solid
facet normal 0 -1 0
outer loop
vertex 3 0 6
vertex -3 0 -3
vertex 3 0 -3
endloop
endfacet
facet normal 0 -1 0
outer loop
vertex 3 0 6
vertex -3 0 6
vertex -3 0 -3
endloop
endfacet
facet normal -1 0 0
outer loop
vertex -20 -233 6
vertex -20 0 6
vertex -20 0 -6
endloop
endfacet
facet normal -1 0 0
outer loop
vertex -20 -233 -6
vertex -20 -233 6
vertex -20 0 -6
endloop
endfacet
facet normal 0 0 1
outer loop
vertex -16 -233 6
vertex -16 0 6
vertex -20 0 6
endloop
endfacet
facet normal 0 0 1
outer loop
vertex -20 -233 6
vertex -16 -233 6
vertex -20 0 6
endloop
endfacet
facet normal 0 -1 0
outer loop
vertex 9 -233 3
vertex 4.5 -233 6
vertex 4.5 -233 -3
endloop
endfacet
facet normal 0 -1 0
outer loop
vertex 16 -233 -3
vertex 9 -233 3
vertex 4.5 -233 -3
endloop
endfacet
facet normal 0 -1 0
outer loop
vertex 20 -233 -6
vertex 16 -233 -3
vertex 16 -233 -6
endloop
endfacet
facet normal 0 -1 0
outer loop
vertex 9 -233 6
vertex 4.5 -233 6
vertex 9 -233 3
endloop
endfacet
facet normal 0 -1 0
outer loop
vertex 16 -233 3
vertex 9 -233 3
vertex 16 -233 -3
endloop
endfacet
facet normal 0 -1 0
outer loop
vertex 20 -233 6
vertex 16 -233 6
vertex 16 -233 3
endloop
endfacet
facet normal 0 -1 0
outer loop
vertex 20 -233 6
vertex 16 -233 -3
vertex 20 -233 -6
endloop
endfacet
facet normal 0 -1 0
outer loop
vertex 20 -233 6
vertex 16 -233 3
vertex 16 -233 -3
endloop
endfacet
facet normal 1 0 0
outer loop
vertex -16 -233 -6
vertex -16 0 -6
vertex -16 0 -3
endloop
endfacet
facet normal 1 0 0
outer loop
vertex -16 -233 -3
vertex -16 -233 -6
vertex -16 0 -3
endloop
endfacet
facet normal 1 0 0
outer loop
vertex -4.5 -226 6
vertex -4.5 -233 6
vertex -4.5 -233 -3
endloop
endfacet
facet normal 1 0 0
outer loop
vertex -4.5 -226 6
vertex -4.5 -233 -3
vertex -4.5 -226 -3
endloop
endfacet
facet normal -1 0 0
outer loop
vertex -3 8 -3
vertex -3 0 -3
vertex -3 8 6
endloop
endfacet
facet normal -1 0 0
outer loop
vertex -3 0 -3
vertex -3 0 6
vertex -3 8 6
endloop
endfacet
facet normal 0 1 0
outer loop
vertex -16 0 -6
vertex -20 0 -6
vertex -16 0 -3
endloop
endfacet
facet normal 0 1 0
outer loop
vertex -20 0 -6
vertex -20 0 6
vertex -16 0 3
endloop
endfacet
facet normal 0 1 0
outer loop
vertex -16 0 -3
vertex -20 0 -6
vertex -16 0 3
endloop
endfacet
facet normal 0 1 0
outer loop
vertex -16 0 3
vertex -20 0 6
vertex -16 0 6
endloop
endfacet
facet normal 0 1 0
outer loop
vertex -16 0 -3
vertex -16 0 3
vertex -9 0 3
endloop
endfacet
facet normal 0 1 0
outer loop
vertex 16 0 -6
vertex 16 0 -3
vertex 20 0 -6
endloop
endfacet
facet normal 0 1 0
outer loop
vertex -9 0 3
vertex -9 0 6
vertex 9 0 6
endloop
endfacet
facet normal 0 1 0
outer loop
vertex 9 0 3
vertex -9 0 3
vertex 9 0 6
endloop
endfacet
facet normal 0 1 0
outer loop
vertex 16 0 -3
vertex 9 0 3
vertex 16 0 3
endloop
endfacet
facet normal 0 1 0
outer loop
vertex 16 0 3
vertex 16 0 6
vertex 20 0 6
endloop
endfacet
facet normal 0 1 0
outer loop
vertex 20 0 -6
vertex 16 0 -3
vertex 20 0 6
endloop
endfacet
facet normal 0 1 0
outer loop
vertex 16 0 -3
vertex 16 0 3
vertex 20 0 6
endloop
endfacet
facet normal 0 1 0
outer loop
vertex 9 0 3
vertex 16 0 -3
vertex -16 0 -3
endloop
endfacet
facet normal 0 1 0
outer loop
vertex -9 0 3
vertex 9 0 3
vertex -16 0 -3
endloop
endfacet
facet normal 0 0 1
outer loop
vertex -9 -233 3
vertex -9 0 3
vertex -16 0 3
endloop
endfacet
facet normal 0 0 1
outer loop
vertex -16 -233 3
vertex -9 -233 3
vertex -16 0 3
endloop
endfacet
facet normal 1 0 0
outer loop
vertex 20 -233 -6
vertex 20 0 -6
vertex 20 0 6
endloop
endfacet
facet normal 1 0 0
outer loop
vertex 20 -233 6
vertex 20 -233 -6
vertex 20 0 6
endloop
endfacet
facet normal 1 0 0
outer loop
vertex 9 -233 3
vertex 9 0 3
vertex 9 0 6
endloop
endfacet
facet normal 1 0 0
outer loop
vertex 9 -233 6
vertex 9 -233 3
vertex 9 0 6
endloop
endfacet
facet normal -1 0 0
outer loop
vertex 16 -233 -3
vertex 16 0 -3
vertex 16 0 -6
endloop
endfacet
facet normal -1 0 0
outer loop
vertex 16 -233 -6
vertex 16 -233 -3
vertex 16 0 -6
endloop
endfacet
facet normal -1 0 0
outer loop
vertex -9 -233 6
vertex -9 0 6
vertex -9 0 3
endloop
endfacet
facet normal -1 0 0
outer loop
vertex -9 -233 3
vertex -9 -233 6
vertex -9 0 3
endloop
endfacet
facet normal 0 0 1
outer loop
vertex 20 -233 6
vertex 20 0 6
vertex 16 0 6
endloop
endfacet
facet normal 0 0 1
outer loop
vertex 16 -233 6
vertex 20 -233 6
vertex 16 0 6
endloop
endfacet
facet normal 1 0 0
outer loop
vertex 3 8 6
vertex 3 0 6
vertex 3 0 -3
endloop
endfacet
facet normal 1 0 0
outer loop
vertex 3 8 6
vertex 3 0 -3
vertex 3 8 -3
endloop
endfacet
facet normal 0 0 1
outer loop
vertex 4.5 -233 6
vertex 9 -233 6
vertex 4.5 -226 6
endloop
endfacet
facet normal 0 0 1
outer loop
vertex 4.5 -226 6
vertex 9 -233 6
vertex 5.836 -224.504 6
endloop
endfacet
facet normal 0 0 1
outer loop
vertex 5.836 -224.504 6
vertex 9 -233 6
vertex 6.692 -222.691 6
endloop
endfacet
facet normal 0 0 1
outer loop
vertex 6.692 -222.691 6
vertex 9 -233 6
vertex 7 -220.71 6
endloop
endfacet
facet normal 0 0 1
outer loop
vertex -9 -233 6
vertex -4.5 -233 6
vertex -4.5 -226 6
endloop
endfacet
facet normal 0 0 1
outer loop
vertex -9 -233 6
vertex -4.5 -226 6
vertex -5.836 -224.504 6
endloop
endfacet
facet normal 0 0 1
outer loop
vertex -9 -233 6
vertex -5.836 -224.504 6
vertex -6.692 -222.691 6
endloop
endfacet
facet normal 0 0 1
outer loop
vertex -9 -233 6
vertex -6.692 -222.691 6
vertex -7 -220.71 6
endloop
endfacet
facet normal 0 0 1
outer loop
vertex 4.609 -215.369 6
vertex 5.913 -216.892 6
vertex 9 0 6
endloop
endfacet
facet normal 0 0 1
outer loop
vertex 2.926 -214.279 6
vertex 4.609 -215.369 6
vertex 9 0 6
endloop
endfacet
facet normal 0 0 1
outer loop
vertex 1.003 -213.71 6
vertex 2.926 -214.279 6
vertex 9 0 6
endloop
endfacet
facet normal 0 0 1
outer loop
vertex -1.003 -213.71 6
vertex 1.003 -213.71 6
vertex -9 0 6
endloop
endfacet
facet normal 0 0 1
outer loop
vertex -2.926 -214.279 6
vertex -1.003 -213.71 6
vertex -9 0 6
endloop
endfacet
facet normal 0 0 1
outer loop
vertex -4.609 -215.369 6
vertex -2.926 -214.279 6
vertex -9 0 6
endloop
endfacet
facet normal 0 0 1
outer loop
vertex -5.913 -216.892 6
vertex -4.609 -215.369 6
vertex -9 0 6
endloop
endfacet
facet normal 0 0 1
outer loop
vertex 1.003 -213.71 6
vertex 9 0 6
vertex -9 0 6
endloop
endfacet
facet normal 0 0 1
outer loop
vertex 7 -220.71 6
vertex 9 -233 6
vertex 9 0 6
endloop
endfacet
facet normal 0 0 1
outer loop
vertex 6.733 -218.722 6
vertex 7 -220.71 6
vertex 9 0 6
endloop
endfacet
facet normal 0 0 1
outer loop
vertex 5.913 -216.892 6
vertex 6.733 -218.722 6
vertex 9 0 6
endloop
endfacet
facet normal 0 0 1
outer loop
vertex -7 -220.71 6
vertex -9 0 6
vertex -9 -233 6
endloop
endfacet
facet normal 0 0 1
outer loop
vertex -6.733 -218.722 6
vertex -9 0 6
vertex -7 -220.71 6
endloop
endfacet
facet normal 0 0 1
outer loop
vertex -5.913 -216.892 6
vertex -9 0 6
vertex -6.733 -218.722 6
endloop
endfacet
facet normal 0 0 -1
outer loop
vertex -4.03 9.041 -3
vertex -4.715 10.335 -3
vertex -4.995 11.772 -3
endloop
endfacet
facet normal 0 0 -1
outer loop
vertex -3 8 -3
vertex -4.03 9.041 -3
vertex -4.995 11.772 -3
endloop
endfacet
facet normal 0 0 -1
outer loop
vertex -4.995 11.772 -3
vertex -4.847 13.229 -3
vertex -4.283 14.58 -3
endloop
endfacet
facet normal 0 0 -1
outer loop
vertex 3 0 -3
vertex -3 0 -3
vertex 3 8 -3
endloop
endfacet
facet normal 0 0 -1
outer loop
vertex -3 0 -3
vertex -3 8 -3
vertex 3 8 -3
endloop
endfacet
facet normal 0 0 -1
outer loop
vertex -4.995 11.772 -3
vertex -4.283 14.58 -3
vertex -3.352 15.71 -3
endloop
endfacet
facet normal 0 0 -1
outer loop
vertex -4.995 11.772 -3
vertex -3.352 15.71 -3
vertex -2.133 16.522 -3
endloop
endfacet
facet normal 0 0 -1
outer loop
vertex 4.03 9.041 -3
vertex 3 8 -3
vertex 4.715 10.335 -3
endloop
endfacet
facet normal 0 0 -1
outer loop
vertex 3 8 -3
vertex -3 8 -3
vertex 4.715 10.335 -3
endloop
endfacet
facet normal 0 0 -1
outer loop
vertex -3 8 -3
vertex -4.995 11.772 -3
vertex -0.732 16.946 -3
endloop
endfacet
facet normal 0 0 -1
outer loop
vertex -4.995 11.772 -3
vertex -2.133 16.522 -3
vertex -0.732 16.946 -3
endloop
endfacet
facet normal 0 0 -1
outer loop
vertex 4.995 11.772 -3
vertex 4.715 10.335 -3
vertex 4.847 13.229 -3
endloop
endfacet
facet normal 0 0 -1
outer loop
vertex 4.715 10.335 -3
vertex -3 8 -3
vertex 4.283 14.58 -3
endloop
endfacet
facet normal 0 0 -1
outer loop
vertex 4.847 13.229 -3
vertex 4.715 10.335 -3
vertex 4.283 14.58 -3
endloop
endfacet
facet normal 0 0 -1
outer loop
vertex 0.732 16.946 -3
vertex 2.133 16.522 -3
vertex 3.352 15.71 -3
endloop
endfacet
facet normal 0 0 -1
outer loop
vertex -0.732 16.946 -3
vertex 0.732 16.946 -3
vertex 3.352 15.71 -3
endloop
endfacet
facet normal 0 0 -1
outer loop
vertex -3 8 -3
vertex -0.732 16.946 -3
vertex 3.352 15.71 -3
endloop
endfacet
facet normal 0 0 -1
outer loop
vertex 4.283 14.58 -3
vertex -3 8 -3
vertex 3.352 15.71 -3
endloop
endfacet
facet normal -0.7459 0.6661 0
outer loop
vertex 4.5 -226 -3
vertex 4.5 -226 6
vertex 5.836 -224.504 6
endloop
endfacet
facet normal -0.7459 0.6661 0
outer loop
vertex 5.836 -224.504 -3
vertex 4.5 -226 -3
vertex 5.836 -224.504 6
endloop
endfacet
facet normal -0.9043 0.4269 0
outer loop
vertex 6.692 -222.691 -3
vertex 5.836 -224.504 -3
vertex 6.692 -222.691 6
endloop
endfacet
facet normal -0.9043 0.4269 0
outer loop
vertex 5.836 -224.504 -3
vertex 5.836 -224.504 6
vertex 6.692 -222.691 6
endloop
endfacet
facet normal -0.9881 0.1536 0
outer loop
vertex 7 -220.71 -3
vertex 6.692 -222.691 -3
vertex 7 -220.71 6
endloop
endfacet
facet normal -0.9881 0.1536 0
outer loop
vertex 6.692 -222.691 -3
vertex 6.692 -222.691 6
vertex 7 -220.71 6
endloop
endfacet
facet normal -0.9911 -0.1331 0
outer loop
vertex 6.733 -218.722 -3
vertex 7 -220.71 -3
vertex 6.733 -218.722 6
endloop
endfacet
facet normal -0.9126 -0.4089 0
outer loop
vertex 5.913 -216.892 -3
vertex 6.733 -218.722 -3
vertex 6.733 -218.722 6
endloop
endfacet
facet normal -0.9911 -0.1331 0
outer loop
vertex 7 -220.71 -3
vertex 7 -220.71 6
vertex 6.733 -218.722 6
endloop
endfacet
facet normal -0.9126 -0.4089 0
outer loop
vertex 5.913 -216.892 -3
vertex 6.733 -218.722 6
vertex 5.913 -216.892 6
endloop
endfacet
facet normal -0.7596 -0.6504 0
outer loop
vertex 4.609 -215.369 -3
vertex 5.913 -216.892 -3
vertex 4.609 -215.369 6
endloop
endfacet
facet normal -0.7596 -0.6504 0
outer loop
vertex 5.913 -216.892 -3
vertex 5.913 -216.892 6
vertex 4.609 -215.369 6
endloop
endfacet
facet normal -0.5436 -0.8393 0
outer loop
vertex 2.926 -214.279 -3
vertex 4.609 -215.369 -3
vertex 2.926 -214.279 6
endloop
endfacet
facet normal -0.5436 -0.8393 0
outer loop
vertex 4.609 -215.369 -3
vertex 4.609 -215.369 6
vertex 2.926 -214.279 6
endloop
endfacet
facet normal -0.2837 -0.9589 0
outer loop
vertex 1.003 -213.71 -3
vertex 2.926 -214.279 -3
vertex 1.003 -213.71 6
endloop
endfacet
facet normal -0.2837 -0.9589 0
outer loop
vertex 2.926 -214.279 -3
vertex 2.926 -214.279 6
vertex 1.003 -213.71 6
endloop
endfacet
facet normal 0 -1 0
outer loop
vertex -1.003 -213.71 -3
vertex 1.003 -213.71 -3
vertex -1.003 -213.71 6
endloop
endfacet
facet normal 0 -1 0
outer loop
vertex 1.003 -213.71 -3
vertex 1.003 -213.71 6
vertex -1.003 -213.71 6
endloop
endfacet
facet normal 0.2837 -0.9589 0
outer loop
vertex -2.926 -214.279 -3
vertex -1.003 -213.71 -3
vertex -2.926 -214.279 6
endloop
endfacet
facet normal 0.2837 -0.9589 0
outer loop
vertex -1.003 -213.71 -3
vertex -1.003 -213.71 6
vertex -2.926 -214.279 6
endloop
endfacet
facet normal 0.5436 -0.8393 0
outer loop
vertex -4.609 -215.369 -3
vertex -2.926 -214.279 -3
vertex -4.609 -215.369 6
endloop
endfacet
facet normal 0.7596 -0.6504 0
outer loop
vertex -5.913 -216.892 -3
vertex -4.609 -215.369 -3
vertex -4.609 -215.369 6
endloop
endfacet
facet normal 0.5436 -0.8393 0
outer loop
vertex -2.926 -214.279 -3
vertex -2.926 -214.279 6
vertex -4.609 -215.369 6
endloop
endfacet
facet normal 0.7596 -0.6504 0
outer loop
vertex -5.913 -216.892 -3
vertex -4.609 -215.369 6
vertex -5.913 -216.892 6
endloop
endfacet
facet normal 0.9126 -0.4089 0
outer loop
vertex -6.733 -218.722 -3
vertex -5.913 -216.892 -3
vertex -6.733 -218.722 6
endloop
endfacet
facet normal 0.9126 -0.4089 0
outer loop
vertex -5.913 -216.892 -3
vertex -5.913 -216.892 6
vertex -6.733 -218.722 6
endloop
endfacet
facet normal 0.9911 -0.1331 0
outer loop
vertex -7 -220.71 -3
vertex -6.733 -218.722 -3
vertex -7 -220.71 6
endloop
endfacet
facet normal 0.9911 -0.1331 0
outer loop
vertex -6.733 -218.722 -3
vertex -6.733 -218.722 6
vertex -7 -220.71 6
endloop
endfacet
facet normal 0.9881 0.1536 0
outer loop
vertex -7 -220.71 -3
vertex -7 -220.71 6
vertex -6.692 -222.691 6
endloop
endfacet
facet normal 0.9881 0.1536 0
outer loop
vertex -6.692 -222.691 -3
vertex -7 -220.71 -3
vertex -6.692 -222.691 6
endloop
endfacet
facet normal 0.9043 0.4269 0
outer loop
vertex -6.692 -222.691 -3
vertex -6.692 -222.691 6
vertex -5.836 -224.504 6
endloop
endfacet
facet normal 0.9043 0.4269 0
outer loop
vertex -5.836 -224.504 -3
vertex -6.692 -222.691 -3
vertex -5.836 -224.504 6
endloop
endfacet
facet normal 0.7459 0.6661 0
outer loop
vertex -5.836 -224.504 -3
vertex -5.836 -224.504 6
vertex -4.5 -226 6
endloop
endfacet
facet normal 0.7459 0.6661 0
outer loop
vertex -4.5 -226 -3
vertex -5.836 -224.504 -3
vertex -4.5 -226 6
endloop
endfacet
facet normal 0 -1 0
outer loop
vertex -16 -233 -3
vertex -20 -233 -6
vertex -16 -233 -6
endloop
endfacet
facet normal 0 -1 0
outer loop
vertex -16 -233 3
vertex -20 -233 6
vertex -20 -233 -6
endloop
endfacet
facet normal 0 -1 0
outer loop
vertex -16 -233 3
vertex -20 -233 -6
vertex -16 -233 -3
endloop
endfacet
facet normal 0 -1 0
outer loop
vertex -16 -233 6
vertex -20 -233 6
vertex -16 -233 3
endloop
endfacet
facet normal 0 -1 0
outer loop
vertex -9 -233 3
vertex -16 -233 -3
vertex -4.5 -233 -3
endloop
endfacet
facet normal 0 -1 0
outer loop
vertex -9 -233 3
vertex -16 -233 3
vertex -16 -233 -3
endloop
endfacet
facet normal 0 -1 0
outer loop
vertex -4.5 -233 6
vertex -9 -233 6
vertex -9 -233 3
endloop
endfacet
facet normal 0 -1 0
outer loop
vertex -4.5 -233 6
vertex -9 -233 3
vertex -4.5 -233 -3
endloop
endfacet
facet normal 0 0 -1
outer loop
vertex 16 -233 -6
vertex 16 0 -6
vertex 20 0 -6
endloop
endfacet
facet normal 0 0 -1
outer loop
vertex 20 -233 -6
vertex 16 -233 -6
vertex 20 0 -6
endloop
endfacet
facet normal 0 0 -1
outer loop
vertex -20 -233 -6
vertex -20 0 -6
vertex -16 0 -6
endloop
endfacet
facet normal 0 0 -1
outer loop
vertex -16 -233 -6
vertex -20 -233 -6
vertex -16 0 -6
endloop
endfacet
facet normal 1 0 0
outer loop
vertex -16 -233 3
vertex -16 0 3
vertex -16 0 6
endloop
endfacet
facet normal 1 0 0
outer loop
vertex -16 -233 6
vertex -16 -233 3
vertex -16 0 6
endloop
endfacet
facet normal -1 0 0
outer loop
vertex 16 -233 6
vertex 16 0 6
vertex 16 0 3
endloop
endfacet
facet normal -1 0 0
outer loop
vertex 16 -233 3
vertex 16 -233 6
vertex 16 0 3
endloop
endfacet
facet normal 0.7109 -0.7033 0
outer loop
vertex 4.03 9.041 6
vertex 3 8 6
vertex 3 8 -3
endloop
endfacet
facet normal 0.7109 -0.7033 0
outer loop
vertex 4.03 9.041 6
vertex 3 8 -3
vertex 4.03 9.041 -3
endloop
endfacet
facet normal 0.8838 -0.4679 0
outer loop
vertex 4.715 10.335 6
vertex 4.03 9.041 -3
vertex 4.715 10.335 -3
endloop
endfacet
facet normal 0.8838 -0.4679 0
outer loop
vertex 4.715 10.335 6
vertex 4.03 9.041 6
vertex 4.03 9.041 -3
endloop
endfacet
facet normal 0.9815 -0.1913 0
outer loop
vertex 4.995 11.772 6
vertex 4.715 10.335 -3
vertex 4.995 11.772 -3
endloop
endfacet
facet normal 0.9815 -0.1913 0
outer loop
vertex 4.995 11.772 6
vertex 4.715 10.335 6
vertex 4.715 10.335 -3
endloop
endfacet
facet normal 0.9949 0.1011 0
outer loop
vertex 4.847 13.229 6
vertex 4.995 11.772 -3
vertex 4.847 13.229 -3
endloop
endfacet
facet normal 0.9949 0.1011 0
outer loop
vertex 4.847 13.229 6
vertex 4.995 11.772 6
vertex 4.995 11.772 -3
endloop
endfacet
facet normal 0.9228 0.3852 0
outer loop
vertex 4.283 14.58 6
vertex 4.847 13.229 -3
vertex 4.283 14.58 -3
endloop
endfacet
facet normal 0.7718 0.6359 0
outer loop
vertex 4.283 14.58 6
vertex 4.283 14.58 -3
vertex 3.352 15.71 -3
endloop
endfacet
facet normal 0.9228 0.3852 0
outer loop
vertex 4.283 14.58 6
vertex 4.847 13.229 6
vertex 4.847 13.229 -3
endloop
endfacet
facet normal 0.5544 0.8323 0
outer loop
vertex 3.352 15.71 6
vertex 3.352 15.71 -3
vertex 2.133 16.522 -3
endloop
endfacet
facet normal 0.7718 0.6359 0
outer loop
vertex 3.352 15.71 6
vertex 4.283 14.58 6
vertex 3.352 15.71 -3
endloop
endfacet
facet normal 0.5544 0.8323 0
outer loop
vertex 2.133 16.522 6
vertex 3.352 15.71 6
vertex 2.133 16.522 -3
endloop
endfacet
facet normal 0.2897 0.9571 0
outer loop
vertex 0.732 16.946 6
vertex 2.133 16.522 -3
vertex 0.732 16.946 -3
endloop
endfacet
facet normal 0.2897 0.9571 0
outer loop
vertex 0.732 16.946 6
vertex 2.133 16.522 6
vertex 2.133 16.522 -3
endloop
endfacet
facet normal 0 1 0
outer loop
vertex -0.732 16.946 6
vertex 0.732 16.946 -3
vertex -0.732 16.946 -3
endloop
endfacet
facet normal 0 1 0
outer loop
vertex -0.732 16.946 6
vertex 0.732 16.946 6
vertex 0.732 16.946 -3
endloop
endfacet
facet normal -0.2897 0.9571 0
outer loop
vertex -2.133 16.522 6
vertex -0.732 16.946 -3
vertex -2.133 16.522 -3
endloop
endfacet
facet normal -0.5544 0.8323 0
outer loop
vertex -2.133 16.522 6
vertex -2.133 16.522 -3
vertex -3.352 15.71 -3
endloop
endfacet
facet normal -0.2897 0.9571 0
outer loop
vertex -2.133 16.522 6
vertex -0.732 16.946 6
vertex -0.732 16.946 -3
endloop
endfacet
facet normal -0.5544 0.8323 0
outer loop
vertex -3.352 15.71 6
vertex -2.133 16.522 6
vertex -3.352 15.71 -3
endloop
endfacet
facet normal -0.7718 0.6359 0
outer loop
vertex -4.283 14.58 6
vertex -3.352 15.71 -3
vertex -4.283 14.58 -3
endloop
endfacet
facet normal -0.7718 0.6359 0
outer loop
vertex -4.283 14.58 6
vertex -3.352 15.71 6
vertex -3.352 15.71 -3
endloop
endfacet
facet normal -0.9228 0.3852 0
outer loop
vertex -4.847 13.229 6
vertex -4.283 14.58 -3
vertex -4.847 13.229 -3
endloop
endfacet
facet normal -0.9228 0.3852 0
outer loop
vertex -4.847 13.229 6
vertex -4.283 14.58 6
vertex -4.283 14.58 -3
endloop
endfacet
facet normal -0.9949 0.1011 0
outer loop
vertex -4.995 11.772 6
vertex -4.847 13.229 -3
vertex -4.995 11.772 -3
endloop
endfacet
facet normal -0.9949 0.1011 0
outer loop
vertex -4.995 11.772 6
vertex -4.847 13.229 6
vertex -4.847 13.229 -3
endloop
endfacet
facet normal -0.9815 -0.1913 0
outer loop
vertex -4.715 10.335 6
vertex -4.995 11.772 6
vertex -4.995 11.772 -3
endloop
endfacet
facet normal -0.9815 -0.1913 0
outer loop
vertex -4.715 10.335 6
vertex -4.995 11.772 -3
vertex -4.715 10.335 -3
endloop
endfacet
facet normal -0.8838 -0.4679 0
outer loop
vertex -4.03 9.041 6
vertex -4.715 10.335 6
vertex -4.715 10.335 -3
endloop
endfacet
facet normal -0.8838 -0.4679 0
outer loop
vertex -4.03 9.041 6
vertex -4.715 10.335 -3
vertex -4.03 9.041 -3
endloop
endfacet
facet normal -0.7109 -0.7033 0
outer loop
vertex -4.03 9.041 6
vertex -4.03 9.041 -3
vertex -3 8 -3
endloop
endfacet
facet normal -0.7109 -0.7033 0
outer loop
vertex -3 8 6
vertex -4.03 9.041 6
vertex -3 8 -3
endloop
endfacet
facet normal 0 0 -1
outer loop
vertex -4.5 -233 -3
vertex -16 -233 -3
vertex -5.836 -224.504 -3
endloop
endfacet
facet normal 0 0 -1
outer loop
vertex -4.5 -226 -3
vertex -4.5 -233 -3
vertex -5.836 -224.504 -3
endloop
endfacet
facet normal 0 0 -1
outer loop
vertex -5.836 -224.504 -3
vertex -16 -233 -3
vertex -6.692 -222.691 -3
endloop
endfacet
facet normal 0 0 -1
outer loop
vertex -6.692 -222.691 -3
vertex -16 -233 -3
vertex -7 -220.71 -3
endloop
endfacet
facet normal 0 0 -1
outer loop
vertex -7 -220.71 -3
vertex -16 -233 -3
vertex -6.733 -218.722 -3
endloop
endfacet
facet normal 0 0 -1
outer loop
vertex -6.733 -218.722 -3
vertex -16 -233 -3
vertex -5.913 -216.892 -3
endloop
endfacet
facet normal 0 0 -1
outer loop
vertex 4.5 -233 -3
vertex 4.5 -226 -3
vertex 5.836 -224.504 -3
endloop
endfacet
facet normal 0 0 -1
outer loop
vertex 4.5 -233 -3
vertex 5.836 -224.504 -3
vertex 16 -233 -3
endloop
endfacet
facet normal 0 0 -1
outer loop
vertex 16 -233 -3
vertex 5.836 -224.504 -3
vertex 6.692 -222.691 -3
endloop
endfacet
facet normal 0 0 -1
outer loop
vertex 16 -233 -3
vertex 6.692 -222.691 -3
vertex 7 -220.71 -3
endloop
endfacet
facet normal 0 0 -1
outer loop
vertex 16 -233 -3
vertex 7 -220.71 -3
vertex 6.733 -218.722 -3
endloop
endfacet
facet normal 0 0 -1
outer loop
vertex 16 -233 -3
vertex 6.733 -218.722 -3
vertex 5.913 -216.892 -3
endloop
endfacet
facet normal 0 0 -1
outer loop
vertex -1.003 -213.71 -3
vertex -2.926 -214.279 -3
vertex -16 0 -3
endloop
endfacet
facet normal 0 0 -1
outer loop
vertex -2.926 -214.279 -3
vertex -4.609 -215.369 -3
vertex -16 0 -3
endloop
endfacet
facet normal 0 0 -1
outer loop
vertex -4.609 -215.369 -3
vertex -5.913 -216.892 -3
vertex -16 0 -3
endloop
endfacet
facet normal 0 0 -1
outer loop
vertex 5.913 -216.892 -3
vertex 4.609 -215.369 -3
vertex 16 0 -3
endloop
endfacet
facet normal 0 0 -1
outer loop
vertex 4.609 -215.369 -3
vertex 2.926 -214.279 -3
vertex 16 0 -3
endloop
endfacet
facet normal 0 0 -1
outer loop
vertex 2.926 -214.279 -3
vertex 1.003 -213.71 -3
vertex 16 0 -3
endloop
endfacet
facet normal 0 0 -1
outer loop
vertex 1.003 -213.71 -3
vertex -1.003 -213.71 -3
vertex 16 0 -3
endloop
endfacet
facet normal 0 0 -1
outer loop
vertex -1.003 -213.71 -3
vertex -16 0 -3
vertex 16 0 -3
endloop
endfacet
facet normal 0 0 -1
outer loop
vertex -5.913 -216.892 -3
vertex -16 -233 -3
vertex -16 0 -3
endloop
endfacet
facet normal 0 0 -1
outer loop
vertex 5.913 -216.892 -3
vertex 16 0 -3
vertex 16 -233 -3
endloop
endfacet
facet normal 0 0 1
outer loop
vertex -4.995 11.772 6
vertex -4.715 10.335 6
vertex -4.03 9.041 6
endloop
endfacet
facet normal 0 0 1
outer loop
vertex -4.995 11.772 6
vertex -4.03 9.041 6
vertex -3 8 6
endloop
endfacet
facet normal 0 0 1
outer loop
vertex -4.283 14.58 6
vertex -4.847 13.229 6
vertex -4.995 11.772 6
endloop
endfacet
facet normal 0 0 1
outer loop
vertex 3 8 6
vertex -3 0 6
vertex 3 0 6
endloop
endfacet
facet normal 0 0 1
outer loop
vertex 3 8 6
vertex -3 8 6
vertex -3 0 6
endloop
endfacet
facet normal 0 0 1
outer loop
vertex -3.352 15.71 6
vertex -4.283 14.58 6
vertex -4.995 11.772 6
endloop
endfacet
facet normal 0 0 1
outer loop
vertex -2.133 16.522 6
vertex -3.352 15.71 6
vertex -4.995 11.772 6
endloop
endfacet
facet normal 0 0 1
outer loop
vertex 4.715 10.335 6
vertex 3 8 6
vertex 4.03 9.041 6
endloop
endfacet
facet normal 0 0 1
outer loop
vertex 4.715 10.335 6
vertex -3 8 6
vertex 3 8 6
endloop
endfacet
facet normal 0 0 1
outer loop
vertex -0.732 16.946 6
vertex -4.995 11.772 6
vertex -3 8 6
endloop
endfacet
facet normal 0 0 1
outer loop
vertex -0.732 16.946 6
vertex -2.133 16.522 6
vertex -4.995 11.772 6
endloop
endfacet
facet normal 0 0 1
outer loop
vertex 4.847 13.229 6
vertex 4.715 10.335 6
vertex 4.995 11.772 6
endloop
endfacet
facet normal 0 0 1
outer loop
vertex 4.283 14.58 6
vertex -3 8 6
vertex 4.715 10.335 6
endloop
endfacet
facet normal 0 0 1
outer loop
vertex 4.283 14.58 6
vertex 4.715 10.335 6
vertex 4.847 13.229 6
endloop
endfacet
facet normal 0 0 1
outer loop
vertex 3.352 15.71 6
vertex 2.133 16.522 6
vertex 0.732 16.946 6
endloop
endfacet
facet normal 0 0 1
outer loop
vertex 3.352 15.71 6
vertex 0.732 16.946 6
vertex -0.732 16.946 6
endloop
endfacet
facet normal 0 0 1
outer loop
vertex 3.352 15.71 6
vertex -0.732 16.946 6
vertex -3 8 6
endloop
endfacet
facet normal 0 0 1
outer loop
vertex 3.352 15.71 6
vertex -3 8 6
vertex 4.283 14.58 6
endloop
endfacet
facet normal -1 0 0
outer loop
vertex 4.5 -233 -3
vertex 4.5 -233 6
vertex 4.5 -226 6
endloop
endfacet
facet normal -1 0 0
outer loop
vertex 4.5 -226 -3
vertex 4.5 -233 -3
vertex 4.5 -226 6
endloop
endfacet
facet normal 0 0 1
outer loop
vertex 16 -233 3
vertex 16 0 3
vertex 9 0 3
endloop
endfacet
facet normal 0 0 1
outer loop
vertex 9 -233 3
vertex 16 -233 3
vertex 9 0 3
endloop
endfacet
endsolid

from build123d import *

# Parameters (mm, degrees)
PAD_DEPTH         = 233
POCKET_DEPTH      = 12.001
PAD001_DEPTH      = 6
PAD001_DEPTH_BACK = 3


with BuildPart() as body:
    # Sketch → Pad (new body)
    with BuildSketch(Plane.XZ):
        Polygon((-20, 6), (-20, -6), (-16, -6), (-16, -3), (-9, -3), (9, -3), (16, -3), (16, -6), (20, -6), (20, 6), (16, 6), (16, 3), (9, 3), (9, 6), (-9, 6), (-9, 3), (-16, 3), (-16, 6), align=None)
    extrude(amount=PAD_DEPTH)

    # Sketch002 (on Face14 of Pad) → Pocket (cut, through all)
    with BuildSketch(Plane(origin=(0, 0, 6), x_dir=(-1, 0, 0), z_dir=(0, 0, 1))):
        with BuildLine():
            Line((-4.5, 233), (4.5, 233))
            Line((4.5, 233), (4.5, 226))
            ThreePointArc((-4.5, 226), (0, 213.638097), (4.5, 226))
            Line((-4.5, 233), (-4.5, 226))
        make_face()
    extrude(amount=-POCKET_DEPTH, mode=Mode.SUBTRACT)


with BuildPart() as body001:
    # Sketch001 → Pad001 (new body, two sides)
    with BuildSketch(Plane.XY) as pad001_sk:
        with BuildLine():
            Line((-3, 0), (3, 0))
            Line((3, 0), (3, 8))
            ThreePointArc((3, 8), (0, 17), (-3, 8))
            Line((-3, 0), (-3, 8))
        make_face()
    extrude(amount=PAD001_DEPTH)
    extrude(pad001_sk.sketch, amount=-PAD001_DEPTH_BACK)


solid = Compound([body.part, body001.part])
